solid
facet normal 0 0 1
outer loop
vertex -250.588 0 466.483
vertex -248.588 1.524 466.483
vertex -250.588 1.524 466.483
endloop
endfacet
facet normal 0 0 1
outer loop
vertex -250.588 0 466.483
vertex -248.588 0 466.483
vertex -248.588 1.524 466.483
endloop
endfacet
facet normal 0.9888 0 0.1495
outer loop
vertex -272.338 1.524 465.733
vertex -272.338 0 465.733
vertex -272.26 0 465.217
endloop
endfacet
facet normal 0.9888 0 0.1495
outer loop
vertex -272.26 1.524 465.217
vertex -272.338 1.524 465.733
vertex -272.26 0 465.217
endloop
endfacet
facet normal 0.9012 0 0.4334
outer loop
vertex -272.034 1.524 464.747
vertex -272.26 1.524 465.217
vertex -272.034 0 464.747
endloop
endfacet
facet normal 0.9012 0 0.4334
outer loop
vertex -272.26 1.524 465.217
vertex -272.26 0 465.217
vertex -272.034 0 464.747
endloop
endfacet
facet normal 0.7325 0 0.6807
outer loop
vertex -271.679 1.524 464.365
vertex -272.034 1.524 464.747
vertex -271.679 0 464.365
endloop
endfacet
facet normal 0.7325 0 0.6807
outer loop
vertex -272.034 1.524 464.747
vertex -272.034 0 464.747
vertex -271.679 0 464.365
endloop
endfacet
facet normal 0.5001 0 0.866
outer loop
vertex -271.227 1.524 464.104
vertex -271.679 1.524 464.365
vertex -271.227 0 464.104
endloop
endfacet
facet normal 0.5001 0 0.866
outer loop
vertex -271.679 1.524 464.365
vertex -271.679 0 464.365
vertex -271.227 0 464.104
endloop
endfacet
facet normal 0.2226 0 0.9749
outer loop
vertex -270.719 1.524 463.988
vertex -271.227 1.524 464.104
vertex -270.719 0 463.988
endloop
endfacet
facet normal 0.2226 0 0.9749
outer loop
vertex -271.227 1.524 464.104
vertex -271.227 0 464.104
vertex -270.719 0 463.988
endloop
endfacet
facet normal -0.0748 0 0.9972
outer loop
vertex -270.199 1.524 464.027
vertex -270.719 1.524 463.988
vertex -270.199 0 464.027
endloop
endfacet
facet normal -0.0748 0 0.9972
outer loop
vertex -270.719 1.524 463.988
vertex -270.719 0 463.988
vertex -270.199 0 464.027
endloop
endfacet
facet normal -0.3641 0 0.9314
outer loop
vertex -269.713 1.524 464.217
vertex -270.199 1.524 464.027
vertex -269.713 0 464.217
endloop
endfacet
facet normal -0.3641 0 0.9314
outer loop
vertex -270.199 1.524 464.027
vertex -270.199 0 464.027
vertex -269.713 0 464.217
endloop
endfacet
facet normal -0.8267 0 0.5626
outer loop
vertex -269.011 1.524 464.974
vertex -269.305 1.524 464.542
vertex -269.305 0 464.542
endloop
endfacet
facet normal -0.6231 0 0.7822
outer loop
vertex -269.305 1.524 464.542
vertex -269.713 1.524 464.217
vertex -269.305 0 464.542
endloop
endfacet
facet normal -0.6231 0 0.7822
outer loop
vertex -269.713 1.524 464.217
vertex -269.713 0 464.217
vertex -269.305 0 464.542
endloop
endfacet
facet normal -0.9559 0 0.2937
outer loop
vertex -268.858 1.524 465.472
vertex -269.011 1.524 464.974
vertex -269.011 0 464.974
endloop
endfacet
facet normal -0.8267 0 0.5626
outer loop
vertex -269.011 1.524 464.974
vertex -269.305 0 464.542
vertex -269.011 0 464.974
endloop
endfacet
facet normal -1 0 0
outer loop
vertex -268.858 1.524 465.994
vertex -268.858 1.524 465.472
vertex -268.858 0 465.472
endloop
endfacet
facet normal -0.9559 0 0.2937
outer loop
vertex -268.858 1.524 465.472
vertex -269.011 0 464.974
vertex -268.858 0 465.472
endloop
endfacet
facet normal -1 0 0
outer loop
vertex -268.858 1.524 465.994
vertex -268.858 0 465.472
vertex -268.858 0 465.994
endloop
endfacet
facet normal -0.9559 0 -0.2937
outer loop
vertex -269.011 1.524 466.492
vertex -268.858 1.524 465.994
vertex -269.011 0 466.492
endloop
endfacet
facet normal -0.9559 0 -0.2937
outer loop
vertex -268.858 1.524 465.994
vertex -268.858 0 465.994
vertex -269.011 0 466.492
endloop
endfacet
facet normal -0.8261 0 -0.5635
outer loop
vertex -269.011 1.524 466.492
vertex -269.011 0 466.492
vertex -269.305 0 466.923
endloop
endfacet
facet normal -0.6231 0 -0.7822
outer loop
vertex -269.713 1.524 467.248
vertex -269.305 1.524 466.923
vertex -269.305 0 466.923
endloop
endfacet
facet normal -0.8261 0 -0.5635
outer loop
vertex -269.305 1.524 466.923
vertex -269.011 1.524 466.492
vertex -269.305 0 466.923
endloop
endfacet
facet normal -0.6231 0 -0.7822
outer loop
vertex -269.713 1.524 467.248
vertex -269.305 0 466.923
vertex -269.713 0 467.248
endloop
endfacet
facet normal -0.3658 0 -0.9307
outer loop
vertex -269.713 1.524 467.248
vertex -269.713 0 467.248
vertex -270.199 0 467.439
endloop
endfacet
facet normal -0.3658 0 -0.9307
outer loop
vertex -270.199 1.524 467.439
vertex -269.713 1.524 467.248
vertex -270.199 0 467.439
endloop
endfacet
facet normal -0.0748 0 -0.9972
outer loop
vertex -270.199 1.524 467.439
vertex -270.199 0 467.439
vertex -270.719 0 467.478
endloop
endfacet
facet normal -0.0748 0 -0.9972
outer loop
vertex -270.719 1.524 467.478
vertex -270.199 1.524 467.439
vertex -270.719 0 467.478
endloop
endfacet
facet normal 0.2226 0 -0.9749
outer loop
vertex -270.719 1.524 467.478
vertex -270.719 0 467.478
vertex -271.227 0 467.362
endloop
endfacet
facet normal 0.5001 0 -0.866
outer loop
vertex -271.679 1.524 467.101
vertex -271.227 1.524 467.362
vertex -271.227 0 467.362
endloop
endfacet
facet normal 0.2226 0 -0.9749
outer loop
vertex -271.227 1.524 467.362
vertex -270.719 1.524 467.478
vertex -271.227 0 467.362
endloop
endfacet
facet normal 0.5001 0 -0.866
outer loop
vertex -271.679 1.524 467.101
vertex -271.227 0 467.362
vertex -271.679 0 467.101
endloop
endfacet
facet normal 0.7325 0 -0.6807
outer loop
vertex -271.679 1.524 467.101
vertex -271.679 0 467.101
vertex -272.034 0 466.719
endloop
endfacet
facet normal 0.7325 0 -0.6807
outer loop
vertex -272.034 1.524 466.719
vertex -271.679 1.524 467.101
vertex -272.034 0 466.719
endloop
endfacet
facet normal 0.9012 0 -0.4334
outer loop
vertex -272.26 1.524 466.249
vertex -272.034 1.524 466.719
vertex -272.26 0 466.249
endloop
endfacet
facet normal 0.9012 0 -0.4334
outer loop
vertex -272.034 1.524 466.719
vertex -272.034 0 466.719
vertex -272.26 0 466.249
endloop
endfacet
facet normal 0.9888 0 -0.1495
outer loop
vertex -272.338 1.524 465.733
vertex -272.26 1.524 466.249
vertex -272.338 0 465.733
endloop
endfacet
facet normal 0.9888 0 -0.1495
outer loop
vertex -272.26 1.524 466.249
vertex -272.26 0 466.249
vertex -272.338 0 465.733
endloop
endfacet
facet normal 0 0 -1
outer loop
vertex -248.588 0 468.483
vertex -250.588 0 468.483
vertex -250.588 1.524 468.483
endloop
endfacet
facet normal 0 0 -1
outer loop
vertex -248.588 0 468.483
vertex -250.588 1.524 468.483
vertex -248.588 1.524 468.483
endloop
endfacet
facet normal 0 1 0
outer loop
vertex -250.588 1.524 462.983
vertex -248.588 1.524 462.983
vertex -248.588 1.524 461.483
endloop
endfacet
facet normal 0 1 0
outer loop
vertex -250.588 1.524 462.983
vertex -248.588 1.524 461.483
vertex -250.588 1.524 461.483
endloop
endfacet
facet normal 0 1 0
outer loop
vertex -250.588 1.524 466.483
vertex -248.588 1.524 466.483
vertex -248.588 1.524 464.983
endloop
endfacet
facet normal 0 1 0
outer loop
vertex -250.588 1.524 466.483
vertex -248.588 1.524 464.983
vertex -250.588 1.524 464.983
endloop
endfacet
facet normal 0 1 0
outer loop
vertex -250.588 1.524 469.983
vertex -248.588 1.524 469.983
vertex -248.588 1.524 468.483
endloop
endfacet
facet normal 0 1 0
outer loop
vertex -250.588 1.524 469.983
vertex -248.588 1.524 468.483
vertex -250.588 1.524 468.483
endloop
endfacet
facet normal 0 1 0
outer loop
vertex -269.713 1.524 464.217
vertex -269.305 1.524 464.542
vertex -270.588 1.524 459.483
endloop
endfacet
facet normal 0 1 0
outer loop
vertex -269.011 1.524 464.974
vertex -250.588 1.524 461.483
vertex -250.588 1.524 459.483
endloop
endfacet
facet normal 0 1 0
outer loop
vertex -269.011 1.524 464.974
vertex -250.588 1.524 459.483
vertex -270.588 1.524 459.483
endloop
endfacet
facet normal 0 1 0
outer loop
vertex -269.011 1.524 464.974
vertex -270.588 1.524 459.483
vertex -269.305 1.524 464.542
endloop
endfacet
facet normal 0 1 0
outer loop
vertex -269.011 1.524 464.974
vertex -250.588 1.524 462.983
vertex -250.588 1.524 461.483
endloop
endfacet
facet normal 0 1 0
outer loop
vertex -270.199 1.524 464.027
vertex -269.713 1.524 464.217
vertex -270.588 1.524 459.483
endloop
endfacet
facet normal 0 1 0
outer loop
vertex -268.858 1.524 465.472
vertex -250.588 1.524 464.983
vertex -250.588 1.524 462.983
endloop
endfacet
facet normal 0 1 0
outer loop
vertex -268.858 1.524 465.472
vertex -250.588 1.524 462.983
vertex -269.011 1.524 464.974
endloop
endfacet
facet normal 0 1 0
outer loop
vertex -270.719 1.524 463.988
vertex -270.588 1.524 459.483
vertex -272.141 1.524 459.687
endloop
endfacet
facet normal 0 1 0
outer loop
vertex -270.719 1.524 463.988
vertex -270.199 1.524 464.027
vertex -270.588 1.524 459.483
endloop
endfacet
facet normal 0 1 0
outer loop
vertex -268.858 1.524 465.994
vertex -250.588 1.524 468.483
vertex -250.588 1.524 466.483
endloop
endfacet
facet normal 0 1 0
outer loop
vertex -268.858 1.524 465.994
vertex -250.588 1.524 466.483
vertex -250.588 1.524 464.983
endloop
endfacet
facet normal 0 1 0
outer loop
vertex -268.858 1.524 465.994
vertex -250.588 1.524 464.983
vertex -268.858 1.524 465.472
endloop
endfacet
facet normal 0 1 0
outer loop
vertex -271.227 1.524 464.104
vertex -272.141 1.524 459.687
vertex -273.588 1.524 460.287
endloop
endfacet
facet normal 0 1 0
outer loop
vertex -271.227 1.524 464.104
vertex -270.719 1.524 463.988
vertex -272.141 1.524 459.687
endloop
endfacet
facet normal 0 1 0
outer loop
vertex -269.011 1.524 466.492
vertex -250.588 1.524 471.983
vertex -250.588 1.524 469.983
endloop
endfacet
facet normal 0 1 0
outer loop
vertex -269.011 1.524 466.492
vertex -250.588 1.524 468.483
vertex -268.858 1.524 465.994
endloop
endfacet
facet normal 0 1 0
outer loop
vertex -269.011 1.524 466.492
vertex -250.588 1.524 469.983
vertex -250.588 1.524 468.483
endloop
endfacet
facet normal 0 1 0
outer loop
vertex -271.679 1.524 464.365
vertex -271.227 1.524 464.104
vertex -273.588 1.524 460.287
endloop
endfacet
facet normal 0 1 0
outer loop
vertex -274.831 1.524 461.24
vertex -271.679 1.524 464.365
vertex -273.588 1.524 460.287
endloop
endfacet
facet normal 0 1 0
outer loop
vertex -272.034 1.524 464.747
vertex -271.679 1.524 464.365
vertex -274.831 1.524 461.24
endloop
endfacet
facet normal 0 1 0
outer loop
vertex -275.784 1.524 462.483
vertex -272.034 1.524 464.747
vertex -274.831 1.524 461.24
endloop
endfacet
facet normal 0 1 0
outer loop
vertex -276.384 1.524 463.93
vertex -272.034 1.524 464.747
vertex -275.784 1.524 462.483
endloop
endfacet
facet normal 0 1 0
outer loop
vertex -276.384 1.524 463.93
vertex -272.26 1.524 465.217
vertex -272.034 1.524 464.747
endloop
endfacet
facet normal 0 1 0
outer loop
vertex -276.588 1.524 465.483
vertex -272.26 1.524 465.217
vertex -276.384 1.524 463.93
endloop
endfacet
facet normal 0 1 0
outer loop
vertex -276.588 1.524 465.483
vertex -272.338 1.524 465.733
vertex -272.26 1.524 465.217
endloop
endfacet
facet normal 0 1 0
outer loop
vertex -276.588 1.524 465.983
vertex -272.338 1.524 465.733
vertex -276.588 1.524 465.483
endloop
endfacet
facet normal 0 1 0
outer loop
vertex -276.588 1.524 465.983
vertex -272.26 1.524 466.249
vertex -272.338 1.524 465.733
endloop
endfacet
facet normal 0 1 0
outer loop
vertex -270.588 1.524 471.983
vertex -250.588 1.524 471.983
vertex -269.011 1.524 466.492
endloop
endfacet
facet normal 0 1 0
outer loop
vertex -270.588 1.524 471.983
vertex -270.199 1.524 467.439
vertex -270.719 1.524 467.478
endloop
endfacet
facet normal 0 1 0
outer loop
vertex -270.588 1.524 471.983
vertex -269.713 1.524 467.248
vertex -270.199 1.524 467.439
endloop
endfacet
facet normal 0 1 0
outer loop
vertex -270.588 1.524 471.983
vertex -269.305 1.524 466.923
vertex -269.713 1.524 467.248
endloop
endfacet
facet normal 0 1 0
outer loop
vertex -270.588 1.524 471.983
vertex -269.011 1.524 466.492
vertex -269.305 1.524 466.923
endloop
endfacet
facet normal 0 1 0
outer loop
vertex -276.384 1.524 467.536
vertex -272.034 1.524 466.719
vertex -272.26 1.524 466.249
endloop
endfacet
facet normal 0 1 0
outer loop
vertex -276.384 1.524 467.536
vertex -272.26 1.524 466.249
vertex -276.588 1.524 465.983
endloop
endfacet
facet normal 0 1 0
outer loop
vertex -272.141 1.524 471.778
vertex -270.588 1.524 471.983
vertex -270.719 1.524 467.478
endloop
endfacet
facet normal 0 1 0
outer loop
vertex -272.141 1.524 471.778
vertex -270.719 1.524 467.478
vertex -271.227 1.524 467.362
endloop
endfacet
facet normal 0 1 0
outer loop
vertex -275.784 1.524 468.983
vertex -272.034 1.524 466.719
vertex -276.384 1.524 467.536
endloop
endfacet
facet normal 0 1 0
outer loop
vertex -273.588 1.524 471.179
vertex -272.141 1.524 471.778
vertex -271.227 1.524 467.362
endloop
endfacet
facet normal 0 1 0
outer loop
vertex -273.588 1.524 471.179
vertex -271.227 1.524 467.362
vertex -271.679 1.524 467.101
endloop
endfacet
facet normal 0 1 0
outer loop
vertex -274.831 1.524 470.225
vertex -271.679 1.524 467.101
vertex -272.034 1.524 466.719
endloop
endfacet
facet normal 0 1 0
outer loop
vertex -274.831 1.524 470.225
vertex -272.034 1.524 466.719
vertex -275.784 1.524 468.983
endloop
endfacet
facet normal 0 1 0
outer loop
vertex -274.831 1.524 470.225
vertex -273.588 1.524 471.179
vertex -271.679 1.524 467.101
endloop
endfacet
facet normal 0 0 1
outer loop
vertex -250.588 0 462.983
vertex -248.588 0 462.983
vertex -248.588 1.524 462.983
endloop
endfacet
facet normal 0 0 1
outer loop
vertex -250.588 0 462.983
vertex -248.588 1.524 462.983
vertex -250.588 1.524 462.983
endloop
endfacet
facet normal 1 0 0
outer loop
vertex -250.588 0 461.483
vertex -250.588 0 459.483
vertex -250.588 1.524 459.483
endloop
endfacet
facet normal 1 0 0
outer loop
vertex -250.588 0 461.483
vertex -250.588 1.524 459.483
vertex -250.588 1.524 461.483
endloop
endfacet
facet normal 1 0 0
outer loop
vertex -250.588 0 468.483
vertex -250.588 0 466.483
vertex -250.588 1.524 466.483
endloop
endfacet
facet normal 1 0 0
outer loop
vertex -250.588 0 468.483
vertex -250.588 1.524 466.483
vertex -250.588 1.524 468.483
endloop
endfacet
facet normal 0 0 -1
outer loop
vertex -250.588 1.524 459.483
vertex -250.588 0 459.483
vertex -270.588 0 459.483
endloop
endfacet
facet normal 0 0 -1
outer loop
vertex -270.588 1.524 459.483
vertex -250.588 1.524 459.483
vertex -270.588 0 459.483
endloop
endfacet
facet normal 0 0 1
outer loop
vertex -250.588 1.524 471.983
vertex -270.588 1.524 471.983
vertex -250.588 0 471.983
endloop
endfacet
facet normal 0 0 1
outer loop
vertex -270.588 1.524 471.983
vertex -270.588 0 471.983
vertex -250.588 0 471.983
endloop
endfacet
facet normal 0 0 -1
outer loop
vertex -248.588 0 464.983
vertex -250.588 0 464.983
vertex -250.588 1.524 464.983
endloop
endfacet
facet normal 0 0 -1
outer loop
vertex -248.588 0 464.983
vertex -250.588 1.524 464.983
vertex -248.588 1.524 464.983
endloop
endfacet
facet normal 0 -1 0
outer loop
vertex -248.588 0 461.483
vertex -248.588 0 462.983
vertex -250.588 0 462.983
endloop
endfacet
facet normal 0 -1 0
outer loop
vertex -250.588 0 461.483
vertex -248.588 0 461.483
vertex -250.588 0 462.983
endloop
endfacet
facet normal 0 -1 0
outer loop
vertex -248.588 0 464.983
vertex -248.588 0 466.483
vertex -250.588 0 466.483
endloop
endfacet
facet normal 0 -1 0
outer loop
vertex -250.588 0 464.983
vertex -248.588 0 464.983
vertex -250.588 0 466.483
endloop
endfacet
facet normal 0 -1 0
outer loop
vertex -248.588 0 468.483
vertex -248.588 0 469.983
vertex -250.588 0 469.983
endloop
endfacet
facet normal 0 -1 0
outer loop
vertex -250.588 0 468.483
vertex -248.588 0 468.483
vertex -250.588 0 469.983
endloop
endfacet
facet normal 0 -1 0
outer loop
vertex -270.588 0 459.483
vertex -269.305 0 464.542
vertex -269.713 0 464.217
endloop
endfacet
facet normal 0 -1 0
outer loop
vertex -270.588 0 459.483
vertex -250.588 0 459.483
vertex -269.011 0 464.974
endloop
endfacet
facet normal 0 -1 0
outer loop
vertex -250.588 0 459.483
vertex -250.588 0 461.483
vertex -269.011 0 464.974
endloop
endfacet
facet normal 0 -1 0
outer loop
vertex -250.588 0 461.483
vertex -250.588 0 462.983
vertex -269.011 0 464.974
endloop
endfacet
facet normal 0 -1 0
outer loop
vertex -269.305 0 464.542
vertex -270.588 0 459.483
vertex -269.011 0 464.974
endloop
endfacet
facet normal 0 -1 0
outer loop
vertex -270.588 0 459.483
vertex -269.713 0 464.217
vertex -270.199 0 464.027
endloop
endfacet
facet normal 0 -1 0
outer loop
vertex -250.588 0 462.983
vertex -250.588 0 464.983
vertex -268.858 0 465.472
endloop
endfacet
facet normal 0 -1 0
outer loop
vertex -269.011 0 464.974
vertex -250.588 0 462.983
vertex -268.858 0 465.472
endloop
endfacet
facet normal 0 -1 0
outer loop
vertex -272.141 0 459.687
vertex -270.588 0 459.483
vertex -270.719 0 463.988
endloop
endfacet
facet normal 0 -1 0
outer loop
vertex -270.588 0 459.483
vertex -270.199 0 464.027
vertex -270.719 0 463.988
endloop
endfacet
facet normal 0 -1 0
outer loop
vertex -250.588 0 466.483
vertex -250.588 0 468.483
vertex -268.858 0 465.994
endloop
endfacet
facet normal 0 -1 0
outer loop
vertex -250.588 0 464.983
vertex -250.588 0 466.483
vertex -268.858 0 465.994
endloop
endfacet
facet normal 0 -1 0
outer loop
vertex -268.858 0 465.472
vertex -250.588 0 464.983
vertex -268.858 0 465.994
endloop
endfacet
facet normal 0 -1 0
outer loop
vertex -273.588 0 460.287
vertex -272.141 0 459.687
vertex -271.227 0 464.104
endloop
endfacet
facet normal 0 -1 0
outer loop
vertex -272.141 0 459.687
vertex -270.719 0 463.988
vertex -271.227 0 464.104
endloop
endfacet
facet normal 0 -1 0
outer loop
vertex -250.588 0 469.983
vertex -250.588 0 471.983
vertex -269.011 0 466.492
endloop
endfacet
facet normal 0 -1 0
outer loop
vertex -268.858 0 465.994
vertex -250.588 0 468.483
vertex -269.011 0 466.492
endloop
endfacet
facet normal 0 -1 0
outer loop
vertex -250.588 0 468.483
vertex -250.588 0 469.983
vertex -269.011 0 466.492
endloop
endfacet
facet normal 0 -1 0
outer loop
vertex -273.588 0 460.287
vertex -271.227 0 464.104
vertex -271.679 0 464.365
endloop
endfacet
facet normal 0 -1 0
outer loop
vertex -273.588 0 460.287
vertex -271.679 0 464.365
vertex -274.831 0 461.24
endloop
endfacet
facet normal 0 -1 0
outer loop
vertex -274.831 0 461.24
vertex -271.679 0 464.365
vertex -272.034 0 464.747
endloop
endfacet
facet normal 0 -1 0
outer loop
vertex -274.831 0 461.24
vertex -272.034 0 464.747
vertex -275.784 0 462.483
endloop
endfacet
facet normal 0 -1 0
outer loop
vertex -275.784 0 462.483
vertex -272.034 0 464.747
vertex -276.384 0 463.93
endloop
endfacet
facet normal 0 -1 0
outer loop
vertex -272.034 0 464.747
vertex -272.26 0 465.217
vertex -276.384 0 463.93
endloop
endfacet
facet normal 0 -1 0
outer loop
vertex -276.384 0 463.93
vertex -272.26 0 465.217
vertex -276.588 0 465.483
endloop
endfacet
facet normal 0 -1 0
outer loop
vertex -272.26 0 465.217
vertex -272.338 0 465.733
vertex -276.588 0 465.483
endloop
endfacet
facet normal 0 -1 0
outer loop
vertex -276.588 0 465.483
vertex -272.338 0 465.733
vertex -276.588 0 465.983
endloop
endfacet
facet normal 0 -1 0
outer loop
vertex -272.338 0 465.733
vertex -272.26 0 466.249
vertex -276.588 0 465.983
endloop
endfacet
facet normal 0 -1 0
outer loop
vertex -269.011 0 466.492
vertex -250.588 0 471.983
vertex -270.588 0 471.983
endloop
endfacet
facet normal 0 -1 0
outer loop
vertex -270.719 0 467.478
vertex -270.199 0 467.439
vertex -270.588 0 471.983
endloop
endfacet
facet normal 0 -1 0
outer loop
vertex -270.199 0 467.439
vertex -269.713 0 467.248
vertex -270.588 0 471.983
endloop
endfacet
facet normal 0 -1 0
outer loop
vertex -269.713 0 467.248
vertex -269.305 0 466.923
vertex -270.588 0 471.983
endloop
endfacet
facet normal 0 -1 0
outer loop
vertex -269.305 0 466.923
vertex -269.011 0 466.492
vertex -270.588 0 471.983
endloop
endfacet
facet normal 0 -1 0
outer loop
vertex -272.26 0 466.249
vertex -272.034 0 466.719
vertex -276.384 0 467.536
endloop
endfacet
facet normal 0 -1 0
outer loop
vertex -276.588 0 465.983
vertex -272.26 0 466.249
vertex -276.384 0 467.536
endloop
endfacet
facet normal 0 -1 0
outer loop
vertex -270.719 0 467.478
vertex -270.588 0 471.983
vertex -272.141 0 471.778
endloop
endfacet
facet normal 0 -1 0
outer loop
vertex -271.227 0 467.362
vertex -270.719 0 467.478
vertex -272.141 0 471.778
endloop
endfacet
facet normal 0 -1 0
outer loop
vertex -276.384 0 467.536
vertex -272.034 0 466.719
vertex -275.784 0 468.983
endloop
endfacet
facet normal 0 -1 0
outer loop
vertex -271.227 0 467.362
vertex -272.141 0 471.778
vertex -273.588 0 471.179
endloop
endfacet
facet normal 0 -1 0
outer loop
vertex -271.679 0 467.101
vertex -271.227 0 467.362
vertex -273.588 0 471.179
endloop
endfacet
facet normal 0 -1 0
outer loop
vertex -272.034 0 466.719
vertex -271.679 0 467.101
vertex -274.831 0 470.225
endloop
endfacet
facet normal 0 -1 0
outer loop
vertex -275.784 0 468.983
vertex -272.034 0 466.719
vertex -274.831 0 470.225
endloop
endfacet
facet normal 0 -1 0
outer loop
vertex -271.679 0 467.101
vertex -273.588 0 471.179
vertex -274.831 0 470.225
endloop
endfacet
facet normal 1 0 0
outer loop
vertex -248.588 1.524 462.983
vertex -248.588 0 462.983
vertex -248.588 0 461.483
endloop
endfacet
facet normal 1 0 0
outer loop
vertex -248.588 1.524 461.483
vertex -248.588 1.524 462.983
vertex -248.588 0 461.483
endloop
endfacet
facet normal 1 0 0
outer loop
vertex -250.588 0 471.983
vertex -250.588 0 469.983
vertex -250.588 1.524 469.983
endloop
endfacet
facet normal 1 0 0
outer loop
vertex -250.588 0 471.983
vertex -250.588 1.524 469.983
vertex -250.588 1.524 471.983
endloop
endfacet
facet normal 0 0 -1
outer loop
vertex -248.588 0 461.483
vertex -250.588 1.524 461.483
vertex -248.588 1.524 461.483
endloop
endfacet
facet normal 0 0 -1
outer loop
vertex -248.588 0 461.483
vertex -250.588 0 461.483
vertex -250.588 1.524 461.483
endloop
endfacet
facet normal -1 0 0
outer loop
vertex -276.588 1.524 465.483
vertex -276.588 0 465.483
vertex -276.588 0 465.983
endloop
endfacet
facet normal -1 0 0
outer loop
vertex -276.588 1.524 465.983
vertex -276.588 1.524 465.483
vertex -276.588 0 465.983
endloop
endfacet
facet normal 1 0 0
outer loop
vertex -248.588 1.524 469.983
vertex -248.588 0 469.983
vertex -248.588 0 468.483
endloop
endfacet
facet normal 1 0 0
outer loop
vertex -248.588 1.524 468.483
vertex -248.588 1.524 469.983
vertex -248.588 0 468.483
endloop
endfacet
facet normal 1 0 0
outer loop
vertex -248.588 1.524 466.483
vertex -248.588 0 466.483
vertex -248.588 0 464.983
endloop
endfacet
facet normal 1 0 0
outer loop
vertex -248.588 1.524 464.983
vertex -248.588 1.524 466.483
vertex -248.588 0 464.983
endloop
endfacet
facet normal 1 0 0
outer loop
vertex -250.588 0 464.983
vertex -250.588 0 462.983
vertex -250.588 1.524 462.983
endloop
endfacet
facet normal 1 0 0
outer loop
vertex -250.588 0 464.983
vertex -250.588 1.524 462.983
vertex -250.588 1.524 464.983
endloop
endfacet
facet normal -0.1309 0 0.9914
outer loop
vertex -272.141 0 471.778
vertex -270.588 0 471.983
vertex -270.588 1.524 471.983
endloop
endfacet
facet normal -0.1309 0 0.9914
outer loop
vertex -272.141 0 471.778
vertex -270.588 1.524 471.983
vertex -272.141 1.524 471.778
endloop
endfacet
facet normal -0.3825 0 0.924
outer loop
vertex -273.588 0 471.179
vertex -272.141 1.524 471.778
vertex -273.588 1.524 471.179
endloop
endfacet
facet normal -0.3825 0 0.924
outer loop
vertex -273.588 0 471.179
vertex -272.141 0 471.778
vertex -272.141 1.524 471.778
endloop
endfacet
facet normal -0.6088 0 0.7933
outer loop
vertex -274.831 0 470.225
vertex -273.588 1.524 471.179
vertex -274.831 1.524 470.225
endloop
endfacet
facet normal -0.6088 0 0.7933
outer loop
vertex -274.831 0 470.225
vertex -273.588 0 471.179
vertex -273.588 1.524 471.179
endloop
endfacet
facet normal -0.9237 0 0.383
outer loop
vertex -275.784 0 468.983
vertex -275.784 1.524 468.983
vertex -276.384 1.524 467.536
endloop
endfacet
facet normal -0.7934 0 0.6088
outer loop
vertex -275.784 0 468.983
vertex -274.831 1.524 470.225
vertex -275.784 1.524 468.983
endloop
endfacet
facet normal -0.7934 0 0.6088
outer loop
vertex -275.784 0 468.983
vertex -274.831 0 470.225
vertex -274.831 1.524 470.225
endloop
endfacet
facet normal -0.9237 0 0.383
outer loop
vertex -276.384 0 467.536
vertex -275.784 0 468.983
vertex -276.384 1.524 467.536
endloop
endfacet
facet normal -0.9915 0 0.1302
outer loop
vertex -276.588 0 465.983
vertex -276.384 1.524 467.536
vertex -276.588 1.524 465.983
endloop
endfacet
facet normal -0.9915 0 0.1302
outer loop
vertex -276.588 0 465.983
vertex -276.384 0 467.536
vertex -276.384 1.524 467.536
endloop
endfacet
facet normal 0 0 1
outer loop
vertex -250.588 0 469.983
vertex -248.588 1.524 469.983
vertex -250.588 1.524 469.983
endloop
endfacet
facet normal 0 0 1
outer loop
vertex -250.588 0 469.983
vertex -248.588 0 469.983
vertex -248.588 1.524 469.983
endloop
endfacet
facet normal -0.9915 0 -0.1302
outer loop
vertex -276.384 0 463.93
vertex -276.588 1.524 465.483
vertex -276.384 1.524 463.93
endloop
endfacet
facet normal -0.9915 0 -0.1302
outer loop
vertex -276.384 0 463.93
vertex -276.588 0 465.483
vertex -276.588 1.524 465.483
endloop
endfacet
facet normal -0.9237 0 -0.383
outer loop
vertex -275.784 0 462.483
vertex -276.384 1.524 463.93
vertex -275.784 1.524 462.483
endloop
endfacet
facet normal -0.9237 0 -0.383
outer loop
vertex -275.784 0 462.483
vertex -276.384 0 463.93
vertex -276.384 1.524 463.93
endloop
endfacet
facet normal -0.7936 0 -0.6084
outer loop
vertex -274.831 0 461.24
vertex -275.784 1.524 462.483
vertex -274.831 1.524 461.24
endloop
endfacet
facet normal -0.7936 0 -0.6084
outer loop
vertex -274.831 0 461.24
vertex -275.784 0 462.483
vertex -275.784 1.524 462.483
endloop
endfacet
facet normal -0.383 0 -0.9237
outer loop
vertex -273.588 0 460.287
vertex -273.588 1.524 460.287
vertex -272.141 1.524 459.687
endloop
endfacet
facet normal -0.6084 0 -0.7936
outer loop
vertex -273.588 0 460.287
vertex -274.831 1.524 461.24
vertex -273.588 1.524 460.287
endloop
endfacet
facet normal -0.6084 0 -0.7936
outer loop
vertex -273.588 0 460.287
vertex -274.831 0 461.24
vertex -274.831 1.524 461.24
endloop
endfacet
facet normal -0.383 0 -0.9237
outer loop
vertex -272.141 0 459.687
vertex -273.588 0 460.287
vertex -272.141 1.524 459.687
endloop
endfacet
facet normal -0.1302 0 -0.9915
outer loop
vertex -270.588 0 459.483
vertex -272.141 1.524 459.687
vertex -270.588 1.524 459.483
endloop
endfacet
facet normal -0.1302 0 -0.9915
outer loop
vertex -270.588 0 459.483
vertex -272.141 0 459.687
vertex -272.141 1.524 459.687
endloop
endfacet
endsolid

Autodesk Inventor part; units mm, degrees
ref_plane "YZ Plane" through (0, 0, 0) normal (1, 0, 0) x (0, 1, 0)
ref_plane "XZ Plane" through (0, 0, 0) normal (0, 1, 0) x (-1, 0, 0)
ref_plane "XY Plane" through (0, 0, 0) normal (0, 0, 1) x (1, 0, 0)
sketch "Sketch1" plane through (0, 0, 0) normal (0, 1, 0) x (-1, 0, 0)
  line L0 (270.588, 471.9828) -> (250.588, 471.9828)
  line L1 (250.588, 459.4828) -> (270.588, 459.4828)
  line L2 (276.588, 465.4828) -> (276.588, 465.9828)
  arc A0 (276.588, 465.9828) -> (270.588, 471.9828) centre (270.588, 465.9828) ccw
  arc A1 (270.588, 459.4828) -> (276.588, 465.4828) centre (270.588, 465.4828) ccw
  circle A2 centre (270.588, 465.7328) radius 1.75
  line L3 (250.588, 459.4828) -> (250.588, 461.4828)
  line L4 (250.588, 461.4828) -> (248.588, 461.4828)
  line L5 (248.588, 462.9828) -> (250.588, 462.9828)
  line L6 (250.588, 462.9828) -> (250.588, 464.9828)
  line L7 (250.588, 464.9828) -> (248.588, 464.9828)
  line L8 (248.588, 466.4828) -> (250.588, 466.4828)
  line L9 (250.588, 466.4828) -> (250.588, 468.4828)
  line L10 (250.588, 468.4828) -> (248.588, 468.4828)
  line L11 (248.588, 462.9828) -> (248.588, 461.4828)
  line L12 (248.588, 469.9828) -> (248.588, 468.4828)
  line L13 (248.588, 466.4828) -> (248.588, 464.9828)
  line L14 (248.588, 469.9828) -> (250.588, 469.9828)
  line L15 (250.588, 469.9828) -> (250.588, 471.9828)
  point P0 (0, 0)
  point P1 (276.588, 471.9828)
  point P2 (276.588, 459.4828)
  dimension "d2" = 6
  dimension "d5" = 3.5
  dimension "d15" = 0
  dimension "d26" = 2
  dimension "d27" = 2
  dimension "d28" = 2
  dimension "d29" = 2
  dimension "d30" = 2
  dimension "d31" = 2
  dimension "d32" = 1.5
  dimension "d33" = 1.5
  dimension "d34" = 2
  dimension "d35" = 1.5
  dimension "d36" = 2
  dimension "d39" = 20
extrude "Extrusion7" add sketch "Sketch1" along normal blind 1.524
properties part number "Connection4-3.5"
